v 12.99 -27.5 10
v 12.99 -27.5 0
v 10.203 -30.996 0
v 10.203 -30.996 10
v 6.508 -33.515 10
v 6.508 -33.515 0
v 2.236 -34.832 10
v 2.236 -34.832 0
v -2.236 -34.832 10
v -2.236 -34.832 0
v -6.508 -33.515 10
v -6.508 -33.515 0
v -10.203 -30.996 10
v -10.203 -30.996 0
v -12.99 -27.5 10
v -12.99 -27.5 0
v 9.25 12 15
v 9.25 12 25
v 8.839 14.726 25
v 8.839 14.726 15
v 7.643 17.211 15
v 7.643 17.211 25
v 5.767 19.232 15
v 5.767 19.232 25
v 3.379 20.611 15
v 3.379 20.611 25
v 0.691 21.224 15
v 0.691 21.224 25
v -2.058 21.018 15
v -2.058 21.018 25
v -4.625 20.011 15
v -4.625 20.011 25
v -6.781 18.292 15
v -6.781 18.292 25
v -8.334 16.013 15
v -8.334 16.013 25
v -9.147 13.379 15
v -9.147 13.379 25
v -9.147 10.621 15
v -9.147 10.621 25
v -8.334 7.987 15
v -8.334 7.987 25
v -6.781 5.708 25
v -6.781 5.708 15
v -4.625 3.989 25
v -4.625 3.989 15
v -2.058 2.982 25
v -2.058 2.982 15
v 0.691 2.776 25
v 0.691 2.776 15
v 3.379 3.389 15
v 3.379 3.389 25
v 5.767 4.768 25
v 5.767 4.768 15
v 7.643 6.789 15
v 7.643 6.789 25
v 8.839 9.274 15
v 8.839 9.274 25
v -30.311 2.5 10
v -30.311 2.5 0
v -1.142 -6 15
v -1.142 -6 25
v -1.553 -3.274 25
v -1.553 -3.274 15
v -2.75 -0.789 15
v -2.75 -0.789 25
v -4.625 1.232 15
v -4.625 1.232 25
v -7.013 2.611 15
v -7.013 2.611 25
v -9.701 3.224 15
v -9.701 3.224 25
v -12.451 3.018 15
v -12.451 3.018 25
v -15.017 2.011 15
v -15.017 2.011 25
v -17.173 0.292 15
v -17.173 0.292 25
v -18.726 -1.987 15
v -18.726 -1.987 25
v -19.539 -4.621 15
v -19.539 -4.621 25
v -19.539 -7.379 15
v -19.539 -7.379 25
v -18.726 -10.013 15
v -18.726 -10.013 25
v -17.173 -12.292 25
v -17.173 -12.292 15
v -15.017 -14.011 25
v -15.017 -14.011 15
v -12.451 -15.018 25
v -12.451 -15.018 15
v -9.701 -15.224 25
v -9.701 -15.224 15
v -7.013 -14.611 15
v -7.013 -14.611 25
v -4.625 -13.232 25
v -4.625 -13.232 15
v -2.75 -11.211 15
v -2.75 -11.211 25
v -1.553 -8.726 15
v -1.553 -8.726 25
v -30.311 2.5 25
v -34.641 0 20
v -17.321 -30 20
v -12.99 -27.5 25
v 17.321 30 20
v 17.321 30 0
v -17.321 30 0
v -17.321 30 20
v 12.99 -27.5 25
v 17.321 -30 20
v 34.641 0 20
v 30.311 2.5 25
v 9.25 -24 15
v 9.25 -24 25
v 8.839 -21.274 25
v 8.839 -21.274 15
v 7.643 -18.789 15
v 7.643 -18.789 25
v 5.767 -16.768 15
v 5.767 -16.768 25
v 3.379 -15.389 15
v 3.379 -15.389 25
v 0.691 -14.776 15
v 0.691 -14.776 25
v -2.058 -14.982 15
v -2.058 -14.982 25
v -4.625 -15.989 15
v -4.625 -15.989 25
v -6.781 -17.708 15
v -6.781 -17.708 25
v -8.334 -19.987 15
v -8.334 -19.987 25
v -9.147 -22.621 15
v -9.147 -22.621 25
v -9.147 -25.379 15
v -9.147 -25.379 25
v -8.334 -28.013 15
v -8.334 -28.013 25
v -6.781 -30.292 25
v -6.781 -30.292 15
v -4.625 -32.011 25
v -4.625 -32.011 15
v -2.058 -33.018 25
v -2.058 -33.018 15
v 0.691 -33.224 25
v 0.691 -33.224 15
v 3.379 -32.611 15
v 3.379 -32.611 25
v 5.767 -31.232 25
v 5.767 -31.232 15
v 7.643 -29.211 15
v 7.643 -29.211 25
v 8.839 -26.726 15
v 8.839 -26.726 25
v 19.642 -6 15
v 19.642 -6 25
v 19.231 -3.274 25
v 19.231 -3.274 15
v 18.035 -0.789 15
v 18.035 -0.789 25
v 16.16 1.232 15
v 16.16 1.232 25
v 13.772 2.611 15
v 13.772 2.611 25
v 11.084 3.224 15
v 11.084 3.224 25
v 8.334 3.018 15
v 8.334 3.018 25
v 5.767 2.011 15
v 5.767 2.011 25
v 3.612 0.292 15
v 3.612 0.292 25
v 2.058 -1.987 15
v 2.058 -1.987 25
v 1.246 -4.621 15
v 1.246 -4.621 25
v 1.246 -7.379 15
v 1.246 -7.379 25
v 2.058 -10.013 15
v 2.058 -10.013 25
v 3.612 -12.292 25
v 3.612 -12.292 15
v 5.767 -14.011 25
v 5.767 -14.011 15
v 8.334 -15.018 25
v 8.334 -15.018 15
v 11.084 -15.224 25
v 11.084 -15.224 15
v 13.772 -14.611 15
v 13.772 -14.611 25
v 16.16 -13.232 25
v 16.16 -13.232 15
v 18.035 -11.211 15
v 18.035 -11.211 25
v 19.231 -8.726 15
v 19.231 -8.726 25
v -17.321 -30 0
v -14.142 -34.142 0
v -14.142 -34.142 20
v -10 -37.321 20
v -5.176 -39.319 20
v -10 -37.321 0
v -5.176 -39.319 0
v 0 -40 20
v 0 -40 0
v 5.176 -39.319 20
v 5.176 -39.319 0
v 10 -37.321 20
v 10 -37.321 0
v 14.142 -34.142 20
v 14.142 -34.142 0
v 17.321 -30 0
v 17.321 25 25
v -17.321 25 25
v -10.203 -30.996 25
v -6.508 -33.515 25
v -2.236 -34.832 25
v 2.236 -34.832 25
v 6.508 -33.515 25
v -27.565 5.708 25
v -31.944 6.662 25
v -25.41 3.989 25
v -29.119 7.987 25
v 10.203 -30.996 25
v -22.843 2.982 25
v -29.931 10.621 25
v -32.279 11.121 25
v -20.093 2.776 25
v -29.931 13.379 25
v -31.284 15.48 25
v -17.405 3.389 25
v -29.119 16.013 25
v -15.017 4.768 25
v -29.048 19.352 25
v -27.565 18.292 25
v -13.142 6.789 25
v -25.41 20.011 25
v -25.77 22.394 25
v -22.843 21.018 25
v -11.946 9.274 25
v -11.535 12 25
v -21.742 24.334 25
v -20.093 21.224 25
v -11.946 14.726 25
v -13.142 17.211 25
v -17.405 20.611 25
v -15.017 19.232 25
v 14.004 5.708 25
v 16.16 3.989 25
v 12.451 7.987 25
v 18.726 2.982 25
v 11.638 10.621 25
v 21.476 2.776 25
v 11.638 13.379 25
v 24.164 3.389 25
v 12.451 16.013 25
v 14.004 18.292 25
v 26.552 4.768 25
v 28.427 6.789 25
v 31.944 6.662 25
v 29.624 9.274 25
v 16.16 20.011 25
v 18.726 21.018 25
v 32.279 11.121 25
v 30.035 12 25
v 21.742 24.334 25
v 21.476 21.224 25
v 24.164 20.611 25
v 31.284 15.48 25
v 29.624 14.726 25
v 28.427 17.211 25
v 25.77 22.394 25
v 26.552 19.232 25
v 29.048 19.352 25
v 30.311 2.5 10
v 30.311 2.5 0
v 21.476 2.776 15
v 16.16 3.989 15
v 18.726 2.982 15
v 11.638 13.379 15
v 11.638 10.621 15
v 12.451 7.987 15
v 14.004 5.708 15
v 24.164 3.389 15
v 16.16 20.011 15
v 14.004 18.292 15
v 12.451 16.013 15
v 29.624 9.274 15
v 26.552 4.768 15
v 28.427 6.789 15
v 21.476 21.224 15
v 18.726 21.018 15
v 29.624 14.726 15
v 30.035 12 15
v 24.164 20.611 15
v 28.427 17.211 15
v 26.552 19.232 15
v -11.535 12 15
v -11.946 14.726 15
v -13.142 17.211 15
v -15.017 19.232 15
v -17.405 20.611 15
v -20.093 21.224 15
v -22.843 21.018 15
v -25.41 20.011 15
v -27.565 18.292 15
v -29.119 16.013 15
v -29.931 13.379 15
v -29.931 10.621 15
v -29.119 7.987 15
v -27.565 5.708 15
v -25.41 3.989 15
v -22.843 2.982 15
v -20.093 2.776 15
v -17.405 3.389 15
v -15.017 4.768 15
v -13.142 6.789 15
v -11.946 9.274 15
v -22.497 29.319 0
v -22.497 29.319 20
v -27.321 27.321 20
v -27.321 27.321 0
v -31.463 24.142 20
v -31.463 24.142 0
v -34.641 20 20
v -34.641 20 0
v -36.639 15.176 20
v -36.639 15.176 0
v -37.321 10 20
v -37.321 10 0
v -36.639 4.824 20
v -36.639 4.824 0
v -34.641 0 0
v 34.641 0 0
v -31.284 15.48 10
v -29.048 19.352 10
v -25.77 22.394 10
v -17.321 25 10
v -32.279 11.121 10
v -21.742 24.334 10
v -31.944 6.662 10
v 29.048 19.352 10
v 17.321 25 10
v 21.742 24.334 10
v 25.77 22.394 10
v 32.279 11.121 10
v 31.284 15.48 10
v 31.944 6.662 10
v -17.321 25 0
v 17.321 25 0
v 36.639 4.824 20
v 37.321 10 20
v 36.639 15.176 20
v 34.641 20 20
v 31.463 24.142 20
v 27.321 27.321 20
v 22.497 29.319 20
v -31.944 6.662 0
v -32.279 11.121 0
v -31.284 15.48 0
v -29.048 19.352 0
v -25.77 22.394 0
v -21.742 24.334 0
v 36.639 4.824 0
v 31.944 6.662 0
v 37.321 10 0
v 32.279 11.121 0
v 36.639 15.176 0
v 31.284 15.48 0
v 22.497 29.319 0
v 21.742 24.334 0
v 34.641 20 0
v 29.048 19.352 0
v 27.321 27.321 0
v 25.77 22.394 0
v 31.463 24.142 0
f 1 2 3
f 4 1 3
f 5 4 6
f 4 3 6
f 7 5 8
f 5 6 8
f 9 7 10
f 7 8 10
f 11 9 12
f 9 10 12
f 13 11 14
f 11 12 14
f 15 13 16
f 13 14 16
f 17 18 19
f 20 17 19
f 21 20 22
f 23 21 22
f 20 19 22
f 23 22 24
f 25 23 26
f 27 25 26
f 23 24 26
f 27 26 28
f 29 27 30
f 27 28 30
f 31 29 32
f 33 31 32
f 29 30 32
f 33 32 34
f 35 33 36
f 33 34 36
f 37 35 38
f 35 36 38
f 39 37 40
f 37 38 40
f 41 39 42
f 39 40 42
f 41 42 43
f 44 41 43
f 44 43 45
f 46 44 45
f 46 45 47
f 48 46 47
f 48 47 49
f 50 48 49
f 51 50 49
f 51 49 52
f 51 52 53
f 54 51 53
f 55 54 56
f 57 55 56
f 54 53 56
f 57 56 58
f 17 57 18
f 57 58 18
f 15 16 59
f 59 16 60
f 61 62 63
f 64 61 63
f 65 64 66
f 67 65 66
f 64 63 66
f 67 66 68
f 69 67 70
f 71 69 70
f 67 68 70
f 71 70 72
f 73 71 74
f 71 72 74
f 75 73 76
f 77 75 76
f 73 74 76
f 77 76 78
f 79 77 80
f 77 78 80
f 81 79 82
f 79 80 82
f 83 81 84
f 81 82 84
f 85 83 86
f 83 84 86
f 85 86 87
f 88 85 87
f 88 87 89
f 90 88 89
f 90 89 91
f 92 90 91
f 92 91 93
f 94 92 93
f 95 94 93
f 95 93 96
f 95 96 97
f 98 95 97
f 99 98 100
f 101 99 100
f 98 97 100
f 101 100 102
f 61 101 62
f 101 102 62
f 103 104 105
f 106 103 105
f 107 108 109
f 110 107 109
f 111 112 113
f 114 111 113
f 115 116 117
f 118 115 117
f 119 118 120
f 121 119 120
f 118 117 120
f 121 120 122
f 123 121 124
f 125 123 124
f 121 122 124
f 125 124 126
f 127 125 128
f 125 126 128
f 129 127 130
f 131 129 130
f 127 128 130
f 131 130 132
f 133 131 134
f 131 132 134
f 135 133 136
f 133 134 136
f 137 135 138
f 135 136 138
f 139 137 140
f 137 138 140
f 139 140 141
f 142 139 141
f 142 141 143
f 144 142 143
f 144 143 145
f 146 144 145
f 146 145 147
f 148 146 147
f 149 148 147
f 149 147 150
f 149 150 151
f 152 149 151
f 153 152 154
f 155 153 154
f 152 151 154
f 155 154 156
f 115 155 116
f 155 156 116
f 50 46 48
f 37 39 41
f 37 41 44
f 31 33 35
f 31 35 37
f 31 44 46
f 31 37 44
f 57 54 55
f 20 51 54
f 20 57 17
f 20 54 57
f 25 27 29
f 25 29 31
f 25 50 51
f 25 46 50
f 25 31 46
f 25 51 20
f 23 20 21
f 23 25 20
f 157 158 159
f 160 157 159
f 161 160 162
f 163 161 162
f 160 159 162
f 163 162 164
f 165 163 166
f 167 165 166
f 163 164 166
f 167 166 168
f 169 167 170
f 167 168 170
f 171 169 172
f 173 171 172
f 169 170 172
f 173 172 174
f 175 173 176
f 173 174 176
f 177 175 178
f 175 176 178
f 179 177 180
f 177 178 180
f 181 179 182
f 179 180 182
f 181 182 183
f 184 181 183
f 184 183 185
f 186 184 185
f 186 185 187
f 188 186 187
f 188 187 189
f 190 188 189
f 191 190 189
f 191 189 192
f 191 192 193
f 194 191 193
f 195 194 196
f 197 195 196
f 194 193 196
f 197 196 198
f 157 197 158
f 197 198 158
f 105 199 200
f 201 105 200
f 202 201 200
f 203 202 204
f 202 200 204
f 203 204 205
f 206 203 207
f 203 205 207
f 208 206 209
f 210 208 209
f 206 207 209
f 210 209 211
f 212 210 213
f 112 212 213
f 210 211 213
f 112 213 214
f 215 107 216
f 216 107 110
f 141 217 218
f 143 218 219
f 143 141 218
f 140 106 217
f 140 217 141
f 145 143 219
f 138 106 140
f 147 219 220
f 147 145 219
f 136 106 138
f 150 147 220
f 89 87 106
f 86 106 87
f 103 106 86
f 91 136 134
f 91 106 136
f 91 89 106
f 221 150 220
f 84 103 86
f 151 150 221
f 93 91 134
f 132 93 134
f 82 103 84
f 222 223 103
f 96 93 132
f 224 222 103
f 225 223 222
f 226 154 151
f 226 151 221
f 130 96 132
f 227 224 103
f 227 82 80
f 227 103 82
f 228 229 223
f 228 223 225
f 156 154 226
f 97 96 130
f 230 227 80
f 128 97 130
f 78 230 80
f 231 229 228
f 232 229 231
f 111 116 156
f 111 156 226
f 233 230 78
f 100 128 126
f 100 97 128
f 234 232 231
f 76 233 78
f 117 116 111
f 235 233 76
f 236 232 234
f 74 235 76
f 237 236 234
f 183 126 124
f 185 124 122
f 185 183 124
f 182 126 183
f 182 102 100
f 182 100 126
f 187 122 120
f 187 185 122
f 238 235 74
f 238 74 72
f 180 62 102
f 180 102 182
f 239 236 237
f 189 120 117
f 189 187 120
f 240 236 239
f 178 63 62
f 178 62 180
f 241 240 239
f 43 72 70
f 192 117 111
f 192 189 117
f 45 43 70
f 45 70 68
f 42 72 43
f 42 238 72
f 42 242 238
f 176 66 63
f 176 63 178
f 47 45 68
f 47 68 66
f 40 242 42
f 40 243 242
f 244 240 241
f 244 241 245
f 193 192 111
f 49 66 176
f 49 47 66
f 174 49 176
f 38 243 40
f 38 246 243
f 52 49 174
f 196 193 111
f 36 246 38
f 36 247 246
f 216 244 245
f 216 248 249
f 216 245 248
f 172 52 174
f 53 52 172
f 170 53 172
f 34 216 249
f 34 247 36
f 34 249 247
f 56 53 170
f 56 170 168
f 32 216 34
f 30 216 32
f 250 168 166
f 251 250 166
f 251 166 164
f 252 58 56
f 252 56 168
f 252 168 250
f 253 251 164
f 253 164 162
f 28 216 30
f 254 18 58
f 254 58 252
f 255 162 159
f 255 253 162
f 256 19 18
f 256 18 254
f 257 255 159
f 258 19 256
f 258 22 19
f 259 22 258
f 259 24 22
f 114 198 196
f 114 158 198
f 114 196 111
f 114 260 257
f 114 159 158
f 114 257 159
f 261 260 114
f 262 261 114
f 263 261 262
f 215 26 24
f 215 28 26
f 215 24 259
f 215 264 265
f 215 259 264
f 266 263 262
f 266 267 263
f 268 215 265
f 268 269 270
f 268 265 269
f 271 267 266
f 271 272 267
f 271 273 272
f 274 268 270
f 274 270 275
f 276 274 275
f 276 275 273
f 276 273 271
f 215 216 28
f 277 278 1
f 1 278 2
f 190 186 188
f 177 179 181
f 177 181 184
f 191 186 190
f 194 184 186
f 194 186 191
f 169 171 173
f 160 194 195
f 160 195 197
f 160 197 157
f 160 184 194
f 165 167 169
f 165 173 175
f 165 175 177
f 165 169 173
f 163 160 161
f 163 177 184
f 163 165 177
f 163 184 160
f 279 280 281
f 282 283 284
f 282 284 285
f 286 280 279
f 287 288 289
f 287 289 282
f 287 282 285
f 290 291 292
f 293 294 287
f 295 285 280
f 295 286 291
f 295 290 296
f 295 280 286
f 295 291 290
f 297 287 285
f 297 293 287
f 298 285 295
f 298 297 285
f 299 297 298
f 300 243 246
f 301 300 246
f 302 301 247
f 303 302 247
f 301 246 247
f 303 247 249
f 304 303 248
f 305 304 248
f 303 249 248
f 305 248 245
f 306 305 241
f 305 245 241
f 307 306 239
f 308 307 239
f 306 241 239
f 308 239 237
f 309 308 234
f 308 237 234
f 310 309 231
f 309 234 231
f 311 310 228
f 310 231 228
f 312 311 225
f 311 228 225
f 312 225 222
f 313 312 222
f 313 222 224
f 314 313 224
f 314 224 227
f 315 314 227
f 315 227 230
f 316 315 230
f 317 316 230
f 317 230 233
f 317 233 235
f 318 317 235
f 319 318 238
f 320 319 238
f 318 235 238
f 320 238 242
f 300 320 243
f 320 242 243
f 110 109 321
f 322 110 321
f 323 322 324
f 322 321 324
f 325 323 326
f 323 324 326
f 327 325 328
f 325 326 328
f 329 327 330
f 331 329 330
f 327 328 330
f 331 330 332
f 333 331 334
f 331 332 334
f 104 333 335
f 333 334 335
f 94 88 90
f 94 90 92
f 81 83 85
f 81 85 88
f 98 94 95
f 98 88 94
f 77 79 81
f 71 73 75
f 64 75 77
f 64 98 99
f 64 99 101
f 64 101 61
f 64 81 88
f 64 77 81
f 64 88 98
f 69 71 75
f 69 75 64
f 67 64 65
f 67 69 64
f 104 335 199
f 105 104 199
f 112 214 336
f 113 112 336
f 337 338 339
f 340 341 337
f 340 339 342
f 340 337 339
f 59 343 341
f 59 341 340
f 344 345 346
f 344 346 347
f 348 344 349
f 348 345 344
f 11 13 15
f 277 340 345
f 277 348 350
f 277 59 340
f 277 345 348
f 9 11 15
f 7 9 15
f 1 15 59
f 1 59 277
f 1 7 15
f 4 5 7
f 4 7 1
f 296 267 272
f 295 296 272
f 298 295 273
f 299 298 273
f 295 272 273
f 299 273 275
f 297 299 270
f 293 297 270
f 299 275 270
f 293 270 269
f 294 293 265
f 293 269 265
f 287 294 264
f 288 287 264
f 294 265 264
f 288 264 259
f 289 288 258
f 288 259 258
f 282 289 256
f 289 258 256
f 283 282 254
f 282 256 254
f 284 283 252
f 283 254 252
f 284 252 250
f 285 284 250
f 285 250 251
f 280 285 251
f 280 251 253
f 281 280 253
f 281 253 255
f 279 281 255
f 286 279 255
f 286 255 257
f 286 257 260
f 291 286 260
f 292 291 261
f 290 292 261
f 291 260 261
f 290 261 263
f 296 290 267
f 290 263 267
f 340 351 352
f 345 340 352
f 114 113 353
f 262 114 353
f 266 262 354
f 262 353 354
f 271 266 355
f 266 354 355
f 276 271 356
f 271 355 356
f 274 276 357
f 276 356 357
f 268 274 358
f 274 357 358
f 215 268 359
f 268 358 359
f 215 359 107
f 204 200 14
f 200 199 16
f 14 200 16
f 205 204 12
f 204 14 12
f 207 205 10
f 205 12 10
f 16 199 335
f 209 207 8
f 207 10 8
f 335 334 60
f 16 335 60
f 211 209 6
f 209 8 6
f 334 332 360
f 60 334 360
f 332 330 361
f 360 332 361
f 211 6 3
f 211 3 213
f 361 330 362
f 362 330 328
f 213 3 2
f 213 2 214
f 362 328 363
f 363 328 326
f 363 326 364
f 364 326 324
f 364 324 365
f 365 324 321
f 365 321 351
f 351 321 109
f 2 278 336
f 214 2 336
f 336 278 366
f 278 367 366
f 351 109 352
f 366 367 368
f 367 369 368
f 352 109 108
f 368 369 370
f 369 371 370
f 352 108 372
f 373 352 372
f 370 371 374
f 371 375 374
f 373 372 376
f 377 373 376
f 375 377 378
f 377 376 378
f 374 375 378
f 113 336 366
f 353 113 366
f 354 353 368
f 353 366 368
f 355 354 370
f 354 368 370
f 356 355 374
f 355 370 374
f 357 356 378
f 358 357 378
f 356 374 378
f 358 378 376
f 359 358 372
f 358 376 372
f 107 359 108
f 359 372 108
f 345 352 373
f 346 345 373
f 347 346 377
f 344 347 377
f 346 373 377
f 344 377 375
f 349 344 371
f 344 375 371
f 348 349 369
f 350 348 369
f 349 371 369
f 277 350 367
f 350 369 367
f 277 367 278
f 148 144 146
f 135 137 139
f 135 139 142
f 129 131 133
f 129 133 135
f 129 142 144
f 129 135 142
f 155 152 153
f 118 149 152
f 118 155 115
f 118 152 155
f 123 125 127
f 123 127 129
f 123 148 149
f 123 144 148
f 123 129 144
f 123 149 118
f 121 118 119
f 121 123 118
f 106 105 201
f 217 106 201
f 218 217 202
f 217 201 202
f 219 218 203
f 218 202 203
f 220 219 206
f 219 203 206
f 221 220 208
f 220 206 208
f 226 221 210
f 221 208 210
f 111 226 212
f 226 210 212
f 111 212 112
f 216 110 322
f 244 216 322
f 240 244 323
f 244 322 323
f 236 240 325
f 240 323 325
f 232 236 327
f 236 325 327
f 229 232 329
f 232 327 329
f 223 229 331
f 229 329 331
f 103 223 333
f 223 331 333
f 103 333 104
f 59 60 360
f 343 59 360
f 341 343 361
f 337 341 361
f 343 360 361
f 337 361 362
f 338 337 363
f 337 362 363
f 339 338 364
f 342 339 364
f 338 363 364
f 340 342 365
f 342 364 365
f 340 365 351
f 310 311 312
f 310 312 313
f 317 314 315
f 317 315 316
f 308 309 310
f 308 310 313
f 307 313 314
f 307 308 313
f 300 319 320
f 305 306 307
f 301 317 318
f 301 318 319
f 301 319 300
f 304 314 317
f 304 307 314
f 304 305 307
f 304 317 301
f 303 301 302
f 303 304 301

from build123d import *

# Parameters (mm, degrees)
F1_DEPTH = 25
F2_R     = 9.25
F3_DEPTH = 10
F4_SIZE  = 5
F6_DEPTH = 10


with BuildPart() as f1:
    # F0 (on Top) → F1 (new body)
    with BuildSketch(Plane.XY):
        with BuildLine():
            Line((17.320508, 30), (-17.320508, 30))
            ThreePointArc((-17.320508, 30), (-34.641016, 20), (-34.641016, 0))
            Line((-34.641016, 0), (-17.320508, -30))
            ThreePointArc((-17.320508, -30), (0, -40), (17.320508, -30))
            Line((17.320508, -30), (34.641016, 0))
            ThreePointArc((34.641016, 0), (34.641016, 20), (17.320508, 30))
        make_face()
    extrude(amount=F1_DEPTH)

    # F2 (on face) → F3 (cut)
    with BuildSketch(Plane.XY.offset(25)):
        with Locations((-20.78461, 12)):
            Circle(F2_R)
        with Locations((0, -24)):
            Circle(F2_R)
        with Locations((20.78461, 12)):
            Circle(F2_R)
        with Locations((0, 12)):
            Circle(F2_R)
        with Locations((-10.392305, -6)):
            Circle(F2_R)
        with Locations((10.392305, -6)):
            Circle(F2_R)
    extrude(amount=-F3_DEPTH, mode=Mode.SUBTRACT)

    # F4
    f4_edges = [f1.edges().sort_by_distance(p)[0] for p in [
        (25.980762, -15, 25),
    ]]
    chamfer(f4_edges, length=F4_SIZE)

    # F5 (on face) → F6 (cut)
    with BuildSketch(Plane(origin=(0, 0, 0), x_dir=(1, 0, 0), z_dir=(0, 0, -1))):
        with BuildLine():
            ThreePointArc((12.990381, 27.5), (0, 35), (-12.990381, 27.5))
            Line((-12.990381, 27.5), (-30.310889, -2.5))
            ThreePointArc((-30.310889, -2.5), (-30.310889, -17.5), (-17.320508, -25))
            Line((-17.320508, -25), (17.320508, -25))
            ThreePointArc((17.320508, -25), (30.310889, -17.5), (30.310889, -2.5))
            Line((30.310889, -2.5), (12.990381, 27.5))
        make_face()
    extrude(amount=-F6_DEPTH, mode=Mode.SUBTRACT)


solid = f1.part
